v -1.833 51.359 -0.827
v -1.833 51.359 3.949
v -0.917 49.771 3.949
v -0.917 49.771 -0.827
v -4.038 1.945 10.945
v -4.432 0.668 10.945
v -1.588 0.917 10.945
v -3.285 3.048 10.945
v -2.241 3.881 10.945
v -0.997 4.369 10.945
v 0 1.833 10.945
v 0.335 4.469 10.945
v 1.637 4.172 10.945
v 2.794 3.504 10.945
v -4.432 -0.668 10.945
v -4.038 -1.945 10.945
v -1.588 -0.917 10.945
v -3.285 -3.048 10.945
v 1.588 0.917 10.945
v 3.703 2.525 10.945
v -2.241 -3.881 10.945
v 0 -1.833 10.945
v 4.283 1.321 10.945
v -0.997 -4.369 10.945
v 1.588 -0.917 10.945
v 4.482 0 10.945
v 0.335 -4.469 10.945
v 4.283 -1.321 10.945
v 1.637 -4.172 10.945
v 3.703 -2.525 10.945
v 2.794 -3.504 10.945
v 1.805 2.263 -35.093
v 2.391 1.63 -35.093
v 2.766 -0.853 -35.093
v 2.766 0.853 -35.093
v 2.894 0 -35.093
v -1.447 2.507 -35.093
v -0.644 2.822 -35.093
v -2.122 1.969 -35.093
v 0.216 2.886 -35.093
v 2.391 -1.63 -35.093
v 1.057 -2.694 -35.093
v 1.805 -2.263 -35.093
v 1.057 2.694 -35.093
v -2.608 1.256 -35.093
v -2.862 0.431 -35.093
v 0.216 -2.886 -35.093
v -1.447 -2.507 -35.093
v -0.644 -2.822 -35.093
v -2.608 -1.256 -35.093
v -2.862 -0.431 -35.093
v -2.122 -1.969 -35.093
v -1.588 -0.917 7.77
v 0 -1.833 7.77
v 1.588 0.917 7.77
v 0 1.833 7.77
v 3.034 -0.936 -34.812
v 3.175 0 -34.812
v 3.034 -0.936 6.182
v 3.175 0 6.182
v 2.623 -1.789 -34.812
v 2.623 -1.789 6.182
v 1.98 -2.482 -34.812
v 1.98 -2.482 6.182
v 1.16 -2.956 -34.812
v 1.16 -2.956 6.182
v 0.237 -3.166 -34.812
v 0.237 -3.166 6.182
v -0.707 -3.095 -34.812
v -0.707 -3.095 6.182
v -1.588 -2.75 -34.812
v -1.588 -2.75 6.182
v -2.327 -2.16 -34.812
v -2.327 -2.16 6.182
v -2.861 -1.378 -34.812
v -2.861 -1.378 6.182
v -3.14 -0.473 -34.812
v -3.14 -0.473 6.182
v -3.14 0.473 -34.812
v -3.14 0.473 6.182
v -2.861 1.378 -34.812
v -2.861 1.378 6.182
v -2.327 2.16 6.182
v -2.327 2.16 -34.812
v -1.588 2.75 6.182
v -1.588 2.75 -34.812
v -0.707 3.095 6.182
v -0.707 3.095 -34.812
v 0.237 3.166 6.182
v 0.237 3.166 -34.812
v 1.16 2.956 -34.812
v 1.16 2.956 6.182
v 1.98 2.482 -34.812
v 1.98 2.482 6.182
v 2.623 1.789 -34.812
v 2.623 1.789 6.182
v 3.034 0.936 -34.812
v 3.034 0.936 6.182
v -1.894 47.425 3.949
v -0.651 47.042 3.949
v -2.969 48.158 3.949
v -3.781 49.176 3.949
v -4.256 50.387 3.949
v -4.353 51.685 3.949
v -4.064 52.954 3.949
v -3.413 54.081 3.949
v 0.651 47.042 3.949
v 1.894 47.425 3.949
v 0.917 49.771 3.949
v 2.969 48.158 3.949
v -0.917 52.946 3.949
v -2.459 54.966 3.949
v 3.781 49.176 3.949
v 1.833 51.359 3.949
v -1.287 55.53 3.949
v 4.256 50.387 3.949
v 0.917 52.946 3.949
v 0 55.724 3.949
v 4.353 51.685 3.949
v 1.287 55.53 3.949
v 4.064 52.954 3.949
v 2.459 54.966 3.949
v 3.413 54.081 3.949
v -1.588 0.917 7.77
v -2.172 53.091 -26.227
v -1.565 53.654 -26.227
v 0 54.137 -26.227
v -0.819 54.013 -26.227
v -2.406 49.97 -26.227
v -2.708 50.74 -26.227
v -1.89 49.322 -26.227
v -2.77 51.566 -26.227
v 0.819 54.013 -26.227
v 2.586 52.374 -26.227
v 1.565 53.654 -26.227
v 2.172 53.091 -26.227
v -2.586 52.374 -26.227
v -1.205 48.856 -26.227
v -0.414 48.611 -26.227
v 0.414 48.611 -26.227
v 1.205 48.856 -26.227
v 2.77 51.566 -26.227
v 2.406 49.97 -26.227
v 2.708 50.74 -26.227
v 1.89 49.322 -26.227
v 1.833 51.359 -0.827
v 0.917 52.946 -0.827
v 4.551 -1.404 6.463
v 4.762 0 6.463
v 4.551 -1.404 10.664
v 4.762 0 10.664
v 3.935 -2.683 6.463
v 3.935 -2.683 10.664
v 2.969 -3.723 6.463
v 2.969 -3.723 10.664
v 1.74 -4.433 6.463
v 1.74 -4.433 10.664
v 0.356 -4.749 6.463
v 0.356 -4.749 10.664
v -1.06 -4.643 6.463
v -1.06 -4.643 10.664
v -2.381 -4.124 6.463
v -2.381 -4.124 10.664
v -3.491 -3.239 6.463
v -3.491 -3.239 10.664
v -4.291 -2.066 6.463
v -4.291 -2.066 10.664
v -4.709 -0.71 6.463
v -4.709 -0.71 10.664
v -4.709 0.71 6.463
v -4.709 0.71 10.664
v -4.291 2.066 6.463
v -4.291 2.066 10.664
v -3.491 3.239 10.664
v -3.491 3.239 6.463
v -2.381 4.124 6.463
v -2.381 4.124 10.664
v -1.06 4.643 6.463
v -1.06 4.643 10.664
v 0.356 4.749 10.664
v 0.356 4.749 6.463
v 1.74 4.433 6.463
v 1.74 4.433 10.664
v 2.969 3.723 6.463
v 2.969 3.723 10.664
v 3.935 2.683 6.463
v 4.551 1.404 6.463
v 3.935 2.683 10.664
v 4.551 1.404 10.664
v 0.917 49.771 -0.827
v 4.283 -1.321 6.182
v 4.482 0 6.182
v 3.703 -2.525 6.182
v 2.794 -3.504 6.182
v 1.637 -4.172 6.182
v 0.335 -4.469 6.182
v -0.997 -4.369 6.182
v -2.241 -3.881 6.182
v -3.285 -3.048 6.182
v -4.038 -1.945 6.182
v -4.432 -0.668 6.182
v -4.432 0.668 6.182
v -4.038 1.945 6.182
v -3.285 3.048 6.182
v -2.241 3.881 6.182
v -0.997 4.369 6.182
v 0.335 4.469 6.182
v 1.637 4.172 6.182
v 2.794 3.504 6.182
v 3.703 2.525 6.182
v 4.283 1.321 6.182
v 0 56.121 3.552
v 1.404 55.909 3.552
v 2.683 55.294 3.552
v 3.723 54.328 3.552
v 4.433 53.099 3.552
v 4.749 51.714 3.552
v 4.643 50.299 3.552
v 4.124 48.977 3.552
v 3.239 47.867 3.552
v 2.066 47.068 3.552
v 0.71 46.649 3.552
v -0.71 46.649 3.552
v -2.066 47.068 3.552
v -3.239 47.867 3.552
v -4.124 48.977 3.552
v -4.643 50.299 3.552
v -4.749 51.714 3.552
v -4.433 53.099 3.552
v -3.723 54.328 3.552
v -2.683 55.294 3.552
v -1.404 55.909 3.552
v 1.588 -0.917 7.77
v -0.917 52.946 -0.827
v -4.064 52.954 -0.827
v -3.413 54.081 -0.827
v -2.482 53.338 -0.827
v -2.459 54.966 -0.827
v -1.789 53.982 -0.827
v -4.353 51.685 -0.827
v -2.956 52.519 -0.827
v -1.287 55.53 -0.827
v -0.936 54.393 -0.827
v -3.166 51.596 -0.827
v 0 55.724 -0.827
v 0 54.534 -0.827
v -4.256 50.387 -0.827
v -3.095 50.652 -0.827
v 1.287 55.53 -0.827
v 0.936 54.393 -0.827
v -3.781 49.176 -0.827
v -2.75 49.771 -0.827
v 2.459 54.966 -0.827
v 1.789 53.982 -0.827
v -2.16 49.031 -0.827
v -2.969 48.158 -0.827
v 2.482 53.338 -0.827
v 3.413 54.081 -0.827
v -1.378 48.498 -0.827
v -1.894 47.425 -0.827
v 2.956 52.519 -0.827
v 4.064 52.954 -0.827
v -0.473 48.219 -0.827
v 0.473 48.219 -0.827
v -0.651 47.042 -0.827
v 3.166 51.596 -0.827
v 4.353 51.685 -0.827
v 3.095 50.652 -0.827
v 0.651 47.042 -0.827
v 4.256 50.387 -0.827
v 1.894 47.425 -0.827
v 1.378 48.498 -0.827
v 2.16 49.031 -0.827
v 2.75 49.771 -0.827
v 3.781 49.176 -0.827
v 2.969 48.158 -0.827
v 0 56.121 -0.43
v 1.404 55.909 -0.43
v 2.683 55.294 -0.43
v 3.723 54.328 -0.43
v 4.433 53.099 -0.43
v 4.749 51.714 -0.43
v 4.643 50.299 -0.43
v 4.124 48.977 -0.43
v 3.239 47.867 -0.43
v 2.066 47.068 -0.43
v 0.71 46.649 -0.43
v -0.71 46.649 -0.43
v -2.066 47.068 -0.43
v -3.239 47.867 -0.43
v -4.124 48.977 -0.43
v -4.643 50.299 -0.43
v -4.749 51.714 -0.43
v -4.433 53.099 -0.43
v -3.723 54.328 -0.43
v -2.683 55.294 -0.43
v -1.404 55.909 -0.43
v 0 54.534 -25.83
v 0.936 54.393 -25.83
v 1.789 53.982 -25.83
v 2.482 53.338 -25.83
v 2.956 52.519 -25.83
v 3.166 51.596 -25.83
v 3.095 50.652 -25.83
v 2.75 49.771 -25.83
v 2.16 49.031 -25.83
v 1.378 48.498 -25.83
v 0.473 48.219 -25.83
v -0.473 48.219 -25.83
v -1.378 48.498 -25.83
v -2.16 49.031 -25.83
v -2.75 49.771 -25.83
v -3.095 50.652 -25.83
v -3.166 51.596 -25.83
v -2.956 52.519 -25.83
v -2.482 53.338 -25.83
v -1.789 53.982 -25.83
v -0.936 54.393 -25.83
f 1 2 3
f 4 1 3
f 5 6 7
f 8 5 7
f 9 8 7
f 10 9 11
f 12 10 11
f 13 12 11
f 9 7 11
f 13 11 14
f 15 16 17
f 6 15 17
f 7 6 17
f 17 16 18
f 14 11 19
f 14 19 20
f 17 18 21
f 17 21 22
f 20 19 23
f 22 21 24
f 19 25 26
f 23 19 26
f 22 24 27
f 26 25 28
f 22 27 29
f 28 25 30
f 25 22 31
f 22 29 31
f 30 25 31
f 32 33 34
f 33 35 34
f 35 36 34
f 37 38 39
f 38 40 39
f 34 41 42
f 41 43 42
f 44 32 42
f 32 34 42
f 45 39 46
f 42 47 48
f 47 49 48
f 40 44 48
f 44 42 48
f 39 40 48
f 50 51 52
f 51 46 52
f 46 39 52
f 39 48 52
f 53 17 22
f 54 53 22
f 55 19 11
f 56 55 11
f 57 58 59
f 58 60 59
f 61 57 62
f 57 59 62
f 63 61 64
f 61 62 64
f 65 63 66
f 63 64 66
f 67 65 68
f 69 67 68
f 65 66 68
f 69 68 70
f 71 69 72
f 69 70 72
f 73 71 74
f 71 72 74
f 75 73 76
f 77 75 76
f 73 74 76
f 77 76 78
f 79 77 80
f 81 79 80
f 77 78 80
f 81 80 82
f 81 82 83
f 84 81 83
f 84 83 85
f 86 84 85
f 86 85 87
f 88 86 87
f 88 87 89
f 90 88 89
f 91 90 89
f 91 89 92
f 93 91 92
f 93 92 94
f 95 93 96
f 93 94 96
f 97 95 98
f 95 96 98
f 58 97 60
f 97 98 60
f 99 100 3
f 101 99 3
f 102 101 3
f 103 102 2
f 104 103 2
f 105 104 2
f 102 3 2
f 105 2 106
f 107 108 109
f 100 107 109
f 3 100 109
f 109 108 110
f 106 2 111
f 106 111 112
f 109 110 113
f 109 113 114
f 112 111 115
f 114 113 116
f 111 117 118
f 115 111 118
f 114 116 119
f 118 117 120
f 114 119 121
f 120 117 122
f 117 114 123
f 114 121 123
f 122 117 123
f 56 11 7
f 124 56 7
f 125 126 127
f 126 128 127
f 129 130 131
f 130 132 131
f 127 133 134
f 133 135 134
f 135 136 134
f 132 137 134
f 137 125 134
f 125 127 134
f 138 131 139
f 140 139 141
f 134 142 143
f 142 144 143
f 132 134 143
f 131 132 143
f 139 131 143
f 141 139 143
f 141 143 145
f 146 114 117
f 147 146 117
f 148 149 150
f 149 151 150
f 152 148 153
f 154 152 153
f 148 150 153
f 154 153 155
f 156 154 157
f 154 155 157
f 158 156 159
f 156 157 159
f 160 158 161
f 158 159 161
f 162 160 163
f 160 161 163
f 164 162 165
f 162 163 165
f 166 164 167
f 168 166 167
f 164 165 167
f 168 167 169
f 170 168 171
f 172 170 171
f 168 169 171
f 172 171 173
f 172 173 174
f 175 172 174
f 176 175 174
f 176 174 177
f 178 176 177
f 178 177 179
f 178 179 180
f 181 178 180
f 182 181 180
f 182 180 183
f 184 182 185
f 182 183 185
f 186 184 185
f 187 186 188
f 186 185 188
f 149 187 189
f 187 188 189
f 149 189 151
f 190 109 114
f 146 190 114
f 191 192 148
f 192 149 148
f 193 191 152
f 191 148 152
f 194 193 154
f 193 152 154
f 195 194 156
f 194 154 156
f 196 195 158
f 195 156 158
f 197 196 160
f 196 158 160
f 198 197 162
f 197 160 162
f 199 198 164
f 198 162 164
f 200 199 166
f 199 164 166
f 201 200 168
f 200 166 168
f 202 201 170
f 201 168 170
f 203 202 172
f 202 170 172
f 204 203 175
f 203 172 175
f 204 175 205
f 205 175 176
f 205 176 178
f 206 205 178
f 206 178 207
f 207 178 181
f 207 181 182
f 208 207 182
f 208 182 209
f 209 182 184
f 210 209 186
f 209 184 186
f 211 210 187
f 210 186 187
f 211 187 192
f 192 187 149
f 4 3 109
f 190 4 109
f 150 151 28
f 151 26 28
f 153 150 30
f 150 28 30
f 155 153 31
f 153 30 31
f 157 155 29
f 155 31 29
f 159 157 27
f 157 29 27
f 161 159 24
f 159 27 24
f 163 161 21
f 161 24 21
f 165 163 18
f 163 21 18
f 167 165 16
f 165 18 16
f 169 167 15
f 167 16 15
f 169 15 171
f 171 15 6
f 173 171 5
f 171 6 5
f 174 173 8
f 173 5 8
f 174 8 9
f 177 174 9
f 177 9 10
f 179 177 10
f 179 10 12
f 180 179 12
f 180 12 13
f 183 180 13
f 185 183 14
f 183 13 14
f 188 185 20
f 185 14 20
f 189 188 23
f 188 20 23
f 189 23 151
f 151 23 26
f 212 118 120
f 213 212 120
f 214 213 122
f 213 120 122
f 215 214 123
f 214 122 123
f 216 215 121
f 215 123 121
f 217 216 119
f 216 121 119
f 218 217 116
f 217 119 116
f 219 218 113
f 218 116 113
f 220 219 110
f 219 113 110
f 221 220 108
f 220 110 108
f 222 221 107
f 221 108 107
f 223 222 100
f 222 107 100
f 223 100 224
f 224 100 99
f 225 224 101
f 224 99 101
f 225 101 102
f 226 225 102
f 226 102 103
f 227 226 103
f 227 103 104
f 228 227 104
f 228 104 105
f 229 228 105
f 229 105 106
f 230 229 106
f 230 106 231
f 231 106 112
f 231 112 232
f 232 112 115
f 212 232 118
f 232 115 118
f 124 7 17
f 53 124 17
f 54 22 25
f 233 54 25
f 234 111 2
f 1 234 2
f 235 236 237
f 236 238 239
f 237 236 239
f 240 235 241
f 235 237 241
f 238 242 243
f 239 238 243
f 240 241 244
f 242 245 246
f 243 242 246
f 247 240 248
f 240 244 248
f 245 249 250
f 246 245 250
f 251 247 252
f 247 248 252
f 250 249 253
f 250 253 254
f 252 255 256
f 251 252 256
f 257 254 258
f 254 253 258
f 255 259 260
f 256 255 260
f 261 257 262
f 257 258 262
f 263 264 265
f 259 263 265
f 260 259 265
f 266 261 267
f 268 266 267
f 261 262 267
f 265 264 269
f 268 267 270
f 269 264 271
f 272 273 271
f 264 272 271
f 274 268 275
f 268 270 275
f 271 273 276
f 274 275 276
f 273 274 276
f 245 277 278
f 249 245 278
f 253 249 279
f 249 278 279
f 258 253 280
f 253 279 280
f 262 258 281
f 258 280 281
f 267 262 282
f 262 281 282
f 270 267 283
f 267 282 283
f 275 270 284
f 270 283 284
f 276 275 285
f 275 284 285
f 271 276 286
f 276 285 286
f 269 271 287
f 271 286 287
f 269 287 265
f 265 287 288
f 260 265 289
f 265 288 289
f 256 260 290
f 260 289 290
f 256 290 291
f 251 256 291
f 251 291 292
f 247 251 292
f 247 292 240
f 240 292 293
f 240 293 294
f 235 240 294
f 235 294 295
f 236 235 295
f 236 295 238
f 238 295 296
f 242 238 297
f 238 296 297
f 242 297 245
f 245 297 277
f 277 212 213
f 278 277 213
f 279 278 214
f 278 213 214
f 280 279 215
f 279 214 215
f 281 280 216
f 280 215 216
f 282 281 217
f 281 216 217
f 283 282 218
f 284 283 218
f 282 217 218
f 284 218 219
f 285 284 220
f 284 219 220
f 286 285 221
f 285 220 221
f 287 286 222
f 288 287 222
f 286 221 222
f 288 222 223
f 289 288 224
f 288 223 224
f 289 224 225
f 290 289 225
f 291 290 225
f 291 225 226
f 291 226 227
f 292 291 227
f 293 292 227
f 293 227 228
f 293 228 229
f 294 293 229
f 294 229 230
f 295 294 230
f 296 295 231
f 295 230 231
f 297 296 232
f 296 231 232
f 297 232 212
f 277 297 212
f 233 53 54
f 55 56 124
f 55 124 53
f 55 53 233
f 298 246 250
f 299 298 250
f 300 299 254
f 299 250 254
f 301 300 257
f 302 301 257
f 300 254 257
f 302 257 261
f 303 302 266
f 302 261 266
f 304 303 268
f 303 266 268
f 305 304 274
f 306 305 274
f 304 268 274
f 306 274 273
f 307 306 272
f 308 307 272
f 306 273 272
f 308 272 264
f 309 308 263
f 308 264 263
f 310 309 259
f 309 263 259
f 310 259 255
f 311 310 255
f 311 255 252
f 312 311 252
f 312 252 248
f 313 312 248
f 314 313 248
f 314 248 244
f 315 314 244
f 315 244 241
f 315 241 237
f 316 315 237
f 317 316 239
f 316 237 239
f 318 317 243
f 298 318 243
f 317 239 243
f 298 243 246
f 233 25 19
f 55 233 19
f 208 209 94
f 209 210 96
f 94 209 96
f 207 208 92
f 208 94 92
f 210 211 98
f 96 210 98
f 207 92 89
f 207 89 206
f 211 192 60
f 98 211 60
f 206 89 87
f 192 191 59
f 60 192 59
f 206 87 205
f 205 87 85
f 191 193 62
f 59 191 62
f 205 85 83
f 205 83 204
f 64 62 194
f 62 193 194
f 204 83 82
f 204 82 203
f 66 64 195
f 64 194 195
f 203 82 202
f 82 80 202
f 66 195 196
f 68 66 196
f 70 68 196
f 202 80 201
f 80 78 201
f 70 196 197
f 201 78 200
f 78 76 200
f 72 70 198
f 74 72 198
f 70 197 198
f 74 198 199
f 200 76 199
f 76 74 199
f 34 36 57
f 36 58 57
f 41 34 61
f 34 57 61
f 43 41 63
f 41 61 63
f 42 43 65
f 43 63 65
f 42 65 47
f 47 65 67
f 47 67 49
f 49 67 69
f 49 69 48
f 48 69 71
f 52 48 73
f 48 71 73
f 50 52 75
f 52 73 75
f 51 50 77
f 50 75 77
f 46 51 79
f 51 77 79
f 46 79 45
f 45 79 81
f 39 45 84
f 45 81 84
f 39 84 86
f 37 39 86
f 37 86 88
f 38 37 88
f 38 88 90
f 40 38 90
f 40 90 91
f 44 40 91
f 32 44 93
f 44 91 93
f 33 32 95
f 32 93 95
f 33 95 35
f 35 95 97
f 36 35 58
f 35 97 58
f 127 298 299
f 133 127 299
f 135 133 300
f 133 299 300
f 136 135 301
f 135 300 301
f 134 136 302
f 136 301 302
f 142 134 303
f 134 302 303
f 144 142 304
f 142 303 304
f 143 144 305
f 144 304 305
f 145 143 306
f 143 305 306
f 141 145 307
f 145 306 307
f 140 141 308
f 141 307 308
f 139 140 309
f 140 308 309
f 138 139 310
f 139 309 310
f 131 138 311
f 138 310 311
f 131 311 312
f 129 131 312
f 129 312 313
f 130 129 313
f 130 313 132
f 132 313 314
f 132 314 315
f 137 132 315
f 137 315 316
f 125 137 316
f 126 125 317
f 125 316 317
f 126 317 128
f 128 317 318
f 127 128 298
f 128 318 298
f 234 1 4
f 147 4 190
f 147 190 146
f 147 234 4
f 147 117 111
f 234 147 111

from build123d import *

# Parameters (mm, degrees)
F0_W     = 3.175
F0_H     = 4.7625
F3_DEPTH = 3.175
F4_W     = 3.175
F4_H     = 4.7752
F4_W_2   = 1.5875
F4_H_2   = 25.4
F6_SIZE  = 0.396875
F8_DEPTH = 4.7752


with BuildPart() as f1:
    # F0 (on Front) → F1 (revolve)
    with BuildSketch(Plane.XZ):
        with Locations((1.5875, 8.5633619311)):
            Rectangle(F0_W, F0_H)
        Polygon((4.4818669962, 10.9446119311), (3.175, 10.9446119311), (3.175, 6.1821119311), (4.4818669962, 6.1821119311), (4.7625, 6.4627449349), (4.7625, 10.6639789274), align=None)
        Polygon((3.175, 6.1821119311), (0, 6.1821119311), (0, -35.0928880689), (2.8943669962, -35.0928880689), (3.175, -34.8122550651), align=None)
    revolve(axis=Axis((0, 0, -12.0741380689), (0, 0, -1)))

    # F2 (on face) → F3 (cut)
    with BuildSketch(Plane.XY.offset(10.9446119311)):
        Polygon((1.5875, 0.9165435523), (0, 1.8330871047), (-1.5875, 0.9165435523), (-1.5875, -0.9165435523), (0, -1.8330871047), (1.5875, -0.9165435523), align=None)
    extrude(amount=-F3_DEPTH, mode=Mode.SUBTRACT)


with BuildPart() as f5:
    # F4 (on Right) → F5 (revolve)
    with BuildSketch(Plane.YZ):
        with Locations((52.9460793122, 1.5609115854)):
            Rectangle(F4_W, F4_H)
        with Locations((55.3273293122, 1.5609115854)):
            Rectangle(F4_W_2, F4_H)
        with Locations((52.9460793122, -13.5266884146)):
            Rectangle(F4_W, F4_H_2)
    revolve(axis=Axis((0, 51.3585793122, -11.1390884146), (0, 0, -1)))

    # F6
    f6_edges = [f5.edges().sort_by_distance(p)[0] for p in [
        (0, 46.596079, 3.948512),
        (0, 46.596079, -0.826688),
        (0, 48.183579, -26.226688),
    ]]
    chamfer(f6_edges, length=F6_SIZE)

    # F7 (on face) → F8 (cut)
    with BuildSketch(Plane.XY.offset(3.9485115854)):
        Polygon((0.9165435523, 52.9460793122), (-0.9165435523, 52.9460793122), (-1.8330871047, 51.3585793122), (-0.9165435523, 49.7710793122), (0.9165435523, 49.7710793122), (1.8330871047, 51.3585793122), align=None)
    extrude(amount=-F8_DEPTH, mode=Mode.SUBTRACT)


solid = Compound([f1.part, f5.part])
